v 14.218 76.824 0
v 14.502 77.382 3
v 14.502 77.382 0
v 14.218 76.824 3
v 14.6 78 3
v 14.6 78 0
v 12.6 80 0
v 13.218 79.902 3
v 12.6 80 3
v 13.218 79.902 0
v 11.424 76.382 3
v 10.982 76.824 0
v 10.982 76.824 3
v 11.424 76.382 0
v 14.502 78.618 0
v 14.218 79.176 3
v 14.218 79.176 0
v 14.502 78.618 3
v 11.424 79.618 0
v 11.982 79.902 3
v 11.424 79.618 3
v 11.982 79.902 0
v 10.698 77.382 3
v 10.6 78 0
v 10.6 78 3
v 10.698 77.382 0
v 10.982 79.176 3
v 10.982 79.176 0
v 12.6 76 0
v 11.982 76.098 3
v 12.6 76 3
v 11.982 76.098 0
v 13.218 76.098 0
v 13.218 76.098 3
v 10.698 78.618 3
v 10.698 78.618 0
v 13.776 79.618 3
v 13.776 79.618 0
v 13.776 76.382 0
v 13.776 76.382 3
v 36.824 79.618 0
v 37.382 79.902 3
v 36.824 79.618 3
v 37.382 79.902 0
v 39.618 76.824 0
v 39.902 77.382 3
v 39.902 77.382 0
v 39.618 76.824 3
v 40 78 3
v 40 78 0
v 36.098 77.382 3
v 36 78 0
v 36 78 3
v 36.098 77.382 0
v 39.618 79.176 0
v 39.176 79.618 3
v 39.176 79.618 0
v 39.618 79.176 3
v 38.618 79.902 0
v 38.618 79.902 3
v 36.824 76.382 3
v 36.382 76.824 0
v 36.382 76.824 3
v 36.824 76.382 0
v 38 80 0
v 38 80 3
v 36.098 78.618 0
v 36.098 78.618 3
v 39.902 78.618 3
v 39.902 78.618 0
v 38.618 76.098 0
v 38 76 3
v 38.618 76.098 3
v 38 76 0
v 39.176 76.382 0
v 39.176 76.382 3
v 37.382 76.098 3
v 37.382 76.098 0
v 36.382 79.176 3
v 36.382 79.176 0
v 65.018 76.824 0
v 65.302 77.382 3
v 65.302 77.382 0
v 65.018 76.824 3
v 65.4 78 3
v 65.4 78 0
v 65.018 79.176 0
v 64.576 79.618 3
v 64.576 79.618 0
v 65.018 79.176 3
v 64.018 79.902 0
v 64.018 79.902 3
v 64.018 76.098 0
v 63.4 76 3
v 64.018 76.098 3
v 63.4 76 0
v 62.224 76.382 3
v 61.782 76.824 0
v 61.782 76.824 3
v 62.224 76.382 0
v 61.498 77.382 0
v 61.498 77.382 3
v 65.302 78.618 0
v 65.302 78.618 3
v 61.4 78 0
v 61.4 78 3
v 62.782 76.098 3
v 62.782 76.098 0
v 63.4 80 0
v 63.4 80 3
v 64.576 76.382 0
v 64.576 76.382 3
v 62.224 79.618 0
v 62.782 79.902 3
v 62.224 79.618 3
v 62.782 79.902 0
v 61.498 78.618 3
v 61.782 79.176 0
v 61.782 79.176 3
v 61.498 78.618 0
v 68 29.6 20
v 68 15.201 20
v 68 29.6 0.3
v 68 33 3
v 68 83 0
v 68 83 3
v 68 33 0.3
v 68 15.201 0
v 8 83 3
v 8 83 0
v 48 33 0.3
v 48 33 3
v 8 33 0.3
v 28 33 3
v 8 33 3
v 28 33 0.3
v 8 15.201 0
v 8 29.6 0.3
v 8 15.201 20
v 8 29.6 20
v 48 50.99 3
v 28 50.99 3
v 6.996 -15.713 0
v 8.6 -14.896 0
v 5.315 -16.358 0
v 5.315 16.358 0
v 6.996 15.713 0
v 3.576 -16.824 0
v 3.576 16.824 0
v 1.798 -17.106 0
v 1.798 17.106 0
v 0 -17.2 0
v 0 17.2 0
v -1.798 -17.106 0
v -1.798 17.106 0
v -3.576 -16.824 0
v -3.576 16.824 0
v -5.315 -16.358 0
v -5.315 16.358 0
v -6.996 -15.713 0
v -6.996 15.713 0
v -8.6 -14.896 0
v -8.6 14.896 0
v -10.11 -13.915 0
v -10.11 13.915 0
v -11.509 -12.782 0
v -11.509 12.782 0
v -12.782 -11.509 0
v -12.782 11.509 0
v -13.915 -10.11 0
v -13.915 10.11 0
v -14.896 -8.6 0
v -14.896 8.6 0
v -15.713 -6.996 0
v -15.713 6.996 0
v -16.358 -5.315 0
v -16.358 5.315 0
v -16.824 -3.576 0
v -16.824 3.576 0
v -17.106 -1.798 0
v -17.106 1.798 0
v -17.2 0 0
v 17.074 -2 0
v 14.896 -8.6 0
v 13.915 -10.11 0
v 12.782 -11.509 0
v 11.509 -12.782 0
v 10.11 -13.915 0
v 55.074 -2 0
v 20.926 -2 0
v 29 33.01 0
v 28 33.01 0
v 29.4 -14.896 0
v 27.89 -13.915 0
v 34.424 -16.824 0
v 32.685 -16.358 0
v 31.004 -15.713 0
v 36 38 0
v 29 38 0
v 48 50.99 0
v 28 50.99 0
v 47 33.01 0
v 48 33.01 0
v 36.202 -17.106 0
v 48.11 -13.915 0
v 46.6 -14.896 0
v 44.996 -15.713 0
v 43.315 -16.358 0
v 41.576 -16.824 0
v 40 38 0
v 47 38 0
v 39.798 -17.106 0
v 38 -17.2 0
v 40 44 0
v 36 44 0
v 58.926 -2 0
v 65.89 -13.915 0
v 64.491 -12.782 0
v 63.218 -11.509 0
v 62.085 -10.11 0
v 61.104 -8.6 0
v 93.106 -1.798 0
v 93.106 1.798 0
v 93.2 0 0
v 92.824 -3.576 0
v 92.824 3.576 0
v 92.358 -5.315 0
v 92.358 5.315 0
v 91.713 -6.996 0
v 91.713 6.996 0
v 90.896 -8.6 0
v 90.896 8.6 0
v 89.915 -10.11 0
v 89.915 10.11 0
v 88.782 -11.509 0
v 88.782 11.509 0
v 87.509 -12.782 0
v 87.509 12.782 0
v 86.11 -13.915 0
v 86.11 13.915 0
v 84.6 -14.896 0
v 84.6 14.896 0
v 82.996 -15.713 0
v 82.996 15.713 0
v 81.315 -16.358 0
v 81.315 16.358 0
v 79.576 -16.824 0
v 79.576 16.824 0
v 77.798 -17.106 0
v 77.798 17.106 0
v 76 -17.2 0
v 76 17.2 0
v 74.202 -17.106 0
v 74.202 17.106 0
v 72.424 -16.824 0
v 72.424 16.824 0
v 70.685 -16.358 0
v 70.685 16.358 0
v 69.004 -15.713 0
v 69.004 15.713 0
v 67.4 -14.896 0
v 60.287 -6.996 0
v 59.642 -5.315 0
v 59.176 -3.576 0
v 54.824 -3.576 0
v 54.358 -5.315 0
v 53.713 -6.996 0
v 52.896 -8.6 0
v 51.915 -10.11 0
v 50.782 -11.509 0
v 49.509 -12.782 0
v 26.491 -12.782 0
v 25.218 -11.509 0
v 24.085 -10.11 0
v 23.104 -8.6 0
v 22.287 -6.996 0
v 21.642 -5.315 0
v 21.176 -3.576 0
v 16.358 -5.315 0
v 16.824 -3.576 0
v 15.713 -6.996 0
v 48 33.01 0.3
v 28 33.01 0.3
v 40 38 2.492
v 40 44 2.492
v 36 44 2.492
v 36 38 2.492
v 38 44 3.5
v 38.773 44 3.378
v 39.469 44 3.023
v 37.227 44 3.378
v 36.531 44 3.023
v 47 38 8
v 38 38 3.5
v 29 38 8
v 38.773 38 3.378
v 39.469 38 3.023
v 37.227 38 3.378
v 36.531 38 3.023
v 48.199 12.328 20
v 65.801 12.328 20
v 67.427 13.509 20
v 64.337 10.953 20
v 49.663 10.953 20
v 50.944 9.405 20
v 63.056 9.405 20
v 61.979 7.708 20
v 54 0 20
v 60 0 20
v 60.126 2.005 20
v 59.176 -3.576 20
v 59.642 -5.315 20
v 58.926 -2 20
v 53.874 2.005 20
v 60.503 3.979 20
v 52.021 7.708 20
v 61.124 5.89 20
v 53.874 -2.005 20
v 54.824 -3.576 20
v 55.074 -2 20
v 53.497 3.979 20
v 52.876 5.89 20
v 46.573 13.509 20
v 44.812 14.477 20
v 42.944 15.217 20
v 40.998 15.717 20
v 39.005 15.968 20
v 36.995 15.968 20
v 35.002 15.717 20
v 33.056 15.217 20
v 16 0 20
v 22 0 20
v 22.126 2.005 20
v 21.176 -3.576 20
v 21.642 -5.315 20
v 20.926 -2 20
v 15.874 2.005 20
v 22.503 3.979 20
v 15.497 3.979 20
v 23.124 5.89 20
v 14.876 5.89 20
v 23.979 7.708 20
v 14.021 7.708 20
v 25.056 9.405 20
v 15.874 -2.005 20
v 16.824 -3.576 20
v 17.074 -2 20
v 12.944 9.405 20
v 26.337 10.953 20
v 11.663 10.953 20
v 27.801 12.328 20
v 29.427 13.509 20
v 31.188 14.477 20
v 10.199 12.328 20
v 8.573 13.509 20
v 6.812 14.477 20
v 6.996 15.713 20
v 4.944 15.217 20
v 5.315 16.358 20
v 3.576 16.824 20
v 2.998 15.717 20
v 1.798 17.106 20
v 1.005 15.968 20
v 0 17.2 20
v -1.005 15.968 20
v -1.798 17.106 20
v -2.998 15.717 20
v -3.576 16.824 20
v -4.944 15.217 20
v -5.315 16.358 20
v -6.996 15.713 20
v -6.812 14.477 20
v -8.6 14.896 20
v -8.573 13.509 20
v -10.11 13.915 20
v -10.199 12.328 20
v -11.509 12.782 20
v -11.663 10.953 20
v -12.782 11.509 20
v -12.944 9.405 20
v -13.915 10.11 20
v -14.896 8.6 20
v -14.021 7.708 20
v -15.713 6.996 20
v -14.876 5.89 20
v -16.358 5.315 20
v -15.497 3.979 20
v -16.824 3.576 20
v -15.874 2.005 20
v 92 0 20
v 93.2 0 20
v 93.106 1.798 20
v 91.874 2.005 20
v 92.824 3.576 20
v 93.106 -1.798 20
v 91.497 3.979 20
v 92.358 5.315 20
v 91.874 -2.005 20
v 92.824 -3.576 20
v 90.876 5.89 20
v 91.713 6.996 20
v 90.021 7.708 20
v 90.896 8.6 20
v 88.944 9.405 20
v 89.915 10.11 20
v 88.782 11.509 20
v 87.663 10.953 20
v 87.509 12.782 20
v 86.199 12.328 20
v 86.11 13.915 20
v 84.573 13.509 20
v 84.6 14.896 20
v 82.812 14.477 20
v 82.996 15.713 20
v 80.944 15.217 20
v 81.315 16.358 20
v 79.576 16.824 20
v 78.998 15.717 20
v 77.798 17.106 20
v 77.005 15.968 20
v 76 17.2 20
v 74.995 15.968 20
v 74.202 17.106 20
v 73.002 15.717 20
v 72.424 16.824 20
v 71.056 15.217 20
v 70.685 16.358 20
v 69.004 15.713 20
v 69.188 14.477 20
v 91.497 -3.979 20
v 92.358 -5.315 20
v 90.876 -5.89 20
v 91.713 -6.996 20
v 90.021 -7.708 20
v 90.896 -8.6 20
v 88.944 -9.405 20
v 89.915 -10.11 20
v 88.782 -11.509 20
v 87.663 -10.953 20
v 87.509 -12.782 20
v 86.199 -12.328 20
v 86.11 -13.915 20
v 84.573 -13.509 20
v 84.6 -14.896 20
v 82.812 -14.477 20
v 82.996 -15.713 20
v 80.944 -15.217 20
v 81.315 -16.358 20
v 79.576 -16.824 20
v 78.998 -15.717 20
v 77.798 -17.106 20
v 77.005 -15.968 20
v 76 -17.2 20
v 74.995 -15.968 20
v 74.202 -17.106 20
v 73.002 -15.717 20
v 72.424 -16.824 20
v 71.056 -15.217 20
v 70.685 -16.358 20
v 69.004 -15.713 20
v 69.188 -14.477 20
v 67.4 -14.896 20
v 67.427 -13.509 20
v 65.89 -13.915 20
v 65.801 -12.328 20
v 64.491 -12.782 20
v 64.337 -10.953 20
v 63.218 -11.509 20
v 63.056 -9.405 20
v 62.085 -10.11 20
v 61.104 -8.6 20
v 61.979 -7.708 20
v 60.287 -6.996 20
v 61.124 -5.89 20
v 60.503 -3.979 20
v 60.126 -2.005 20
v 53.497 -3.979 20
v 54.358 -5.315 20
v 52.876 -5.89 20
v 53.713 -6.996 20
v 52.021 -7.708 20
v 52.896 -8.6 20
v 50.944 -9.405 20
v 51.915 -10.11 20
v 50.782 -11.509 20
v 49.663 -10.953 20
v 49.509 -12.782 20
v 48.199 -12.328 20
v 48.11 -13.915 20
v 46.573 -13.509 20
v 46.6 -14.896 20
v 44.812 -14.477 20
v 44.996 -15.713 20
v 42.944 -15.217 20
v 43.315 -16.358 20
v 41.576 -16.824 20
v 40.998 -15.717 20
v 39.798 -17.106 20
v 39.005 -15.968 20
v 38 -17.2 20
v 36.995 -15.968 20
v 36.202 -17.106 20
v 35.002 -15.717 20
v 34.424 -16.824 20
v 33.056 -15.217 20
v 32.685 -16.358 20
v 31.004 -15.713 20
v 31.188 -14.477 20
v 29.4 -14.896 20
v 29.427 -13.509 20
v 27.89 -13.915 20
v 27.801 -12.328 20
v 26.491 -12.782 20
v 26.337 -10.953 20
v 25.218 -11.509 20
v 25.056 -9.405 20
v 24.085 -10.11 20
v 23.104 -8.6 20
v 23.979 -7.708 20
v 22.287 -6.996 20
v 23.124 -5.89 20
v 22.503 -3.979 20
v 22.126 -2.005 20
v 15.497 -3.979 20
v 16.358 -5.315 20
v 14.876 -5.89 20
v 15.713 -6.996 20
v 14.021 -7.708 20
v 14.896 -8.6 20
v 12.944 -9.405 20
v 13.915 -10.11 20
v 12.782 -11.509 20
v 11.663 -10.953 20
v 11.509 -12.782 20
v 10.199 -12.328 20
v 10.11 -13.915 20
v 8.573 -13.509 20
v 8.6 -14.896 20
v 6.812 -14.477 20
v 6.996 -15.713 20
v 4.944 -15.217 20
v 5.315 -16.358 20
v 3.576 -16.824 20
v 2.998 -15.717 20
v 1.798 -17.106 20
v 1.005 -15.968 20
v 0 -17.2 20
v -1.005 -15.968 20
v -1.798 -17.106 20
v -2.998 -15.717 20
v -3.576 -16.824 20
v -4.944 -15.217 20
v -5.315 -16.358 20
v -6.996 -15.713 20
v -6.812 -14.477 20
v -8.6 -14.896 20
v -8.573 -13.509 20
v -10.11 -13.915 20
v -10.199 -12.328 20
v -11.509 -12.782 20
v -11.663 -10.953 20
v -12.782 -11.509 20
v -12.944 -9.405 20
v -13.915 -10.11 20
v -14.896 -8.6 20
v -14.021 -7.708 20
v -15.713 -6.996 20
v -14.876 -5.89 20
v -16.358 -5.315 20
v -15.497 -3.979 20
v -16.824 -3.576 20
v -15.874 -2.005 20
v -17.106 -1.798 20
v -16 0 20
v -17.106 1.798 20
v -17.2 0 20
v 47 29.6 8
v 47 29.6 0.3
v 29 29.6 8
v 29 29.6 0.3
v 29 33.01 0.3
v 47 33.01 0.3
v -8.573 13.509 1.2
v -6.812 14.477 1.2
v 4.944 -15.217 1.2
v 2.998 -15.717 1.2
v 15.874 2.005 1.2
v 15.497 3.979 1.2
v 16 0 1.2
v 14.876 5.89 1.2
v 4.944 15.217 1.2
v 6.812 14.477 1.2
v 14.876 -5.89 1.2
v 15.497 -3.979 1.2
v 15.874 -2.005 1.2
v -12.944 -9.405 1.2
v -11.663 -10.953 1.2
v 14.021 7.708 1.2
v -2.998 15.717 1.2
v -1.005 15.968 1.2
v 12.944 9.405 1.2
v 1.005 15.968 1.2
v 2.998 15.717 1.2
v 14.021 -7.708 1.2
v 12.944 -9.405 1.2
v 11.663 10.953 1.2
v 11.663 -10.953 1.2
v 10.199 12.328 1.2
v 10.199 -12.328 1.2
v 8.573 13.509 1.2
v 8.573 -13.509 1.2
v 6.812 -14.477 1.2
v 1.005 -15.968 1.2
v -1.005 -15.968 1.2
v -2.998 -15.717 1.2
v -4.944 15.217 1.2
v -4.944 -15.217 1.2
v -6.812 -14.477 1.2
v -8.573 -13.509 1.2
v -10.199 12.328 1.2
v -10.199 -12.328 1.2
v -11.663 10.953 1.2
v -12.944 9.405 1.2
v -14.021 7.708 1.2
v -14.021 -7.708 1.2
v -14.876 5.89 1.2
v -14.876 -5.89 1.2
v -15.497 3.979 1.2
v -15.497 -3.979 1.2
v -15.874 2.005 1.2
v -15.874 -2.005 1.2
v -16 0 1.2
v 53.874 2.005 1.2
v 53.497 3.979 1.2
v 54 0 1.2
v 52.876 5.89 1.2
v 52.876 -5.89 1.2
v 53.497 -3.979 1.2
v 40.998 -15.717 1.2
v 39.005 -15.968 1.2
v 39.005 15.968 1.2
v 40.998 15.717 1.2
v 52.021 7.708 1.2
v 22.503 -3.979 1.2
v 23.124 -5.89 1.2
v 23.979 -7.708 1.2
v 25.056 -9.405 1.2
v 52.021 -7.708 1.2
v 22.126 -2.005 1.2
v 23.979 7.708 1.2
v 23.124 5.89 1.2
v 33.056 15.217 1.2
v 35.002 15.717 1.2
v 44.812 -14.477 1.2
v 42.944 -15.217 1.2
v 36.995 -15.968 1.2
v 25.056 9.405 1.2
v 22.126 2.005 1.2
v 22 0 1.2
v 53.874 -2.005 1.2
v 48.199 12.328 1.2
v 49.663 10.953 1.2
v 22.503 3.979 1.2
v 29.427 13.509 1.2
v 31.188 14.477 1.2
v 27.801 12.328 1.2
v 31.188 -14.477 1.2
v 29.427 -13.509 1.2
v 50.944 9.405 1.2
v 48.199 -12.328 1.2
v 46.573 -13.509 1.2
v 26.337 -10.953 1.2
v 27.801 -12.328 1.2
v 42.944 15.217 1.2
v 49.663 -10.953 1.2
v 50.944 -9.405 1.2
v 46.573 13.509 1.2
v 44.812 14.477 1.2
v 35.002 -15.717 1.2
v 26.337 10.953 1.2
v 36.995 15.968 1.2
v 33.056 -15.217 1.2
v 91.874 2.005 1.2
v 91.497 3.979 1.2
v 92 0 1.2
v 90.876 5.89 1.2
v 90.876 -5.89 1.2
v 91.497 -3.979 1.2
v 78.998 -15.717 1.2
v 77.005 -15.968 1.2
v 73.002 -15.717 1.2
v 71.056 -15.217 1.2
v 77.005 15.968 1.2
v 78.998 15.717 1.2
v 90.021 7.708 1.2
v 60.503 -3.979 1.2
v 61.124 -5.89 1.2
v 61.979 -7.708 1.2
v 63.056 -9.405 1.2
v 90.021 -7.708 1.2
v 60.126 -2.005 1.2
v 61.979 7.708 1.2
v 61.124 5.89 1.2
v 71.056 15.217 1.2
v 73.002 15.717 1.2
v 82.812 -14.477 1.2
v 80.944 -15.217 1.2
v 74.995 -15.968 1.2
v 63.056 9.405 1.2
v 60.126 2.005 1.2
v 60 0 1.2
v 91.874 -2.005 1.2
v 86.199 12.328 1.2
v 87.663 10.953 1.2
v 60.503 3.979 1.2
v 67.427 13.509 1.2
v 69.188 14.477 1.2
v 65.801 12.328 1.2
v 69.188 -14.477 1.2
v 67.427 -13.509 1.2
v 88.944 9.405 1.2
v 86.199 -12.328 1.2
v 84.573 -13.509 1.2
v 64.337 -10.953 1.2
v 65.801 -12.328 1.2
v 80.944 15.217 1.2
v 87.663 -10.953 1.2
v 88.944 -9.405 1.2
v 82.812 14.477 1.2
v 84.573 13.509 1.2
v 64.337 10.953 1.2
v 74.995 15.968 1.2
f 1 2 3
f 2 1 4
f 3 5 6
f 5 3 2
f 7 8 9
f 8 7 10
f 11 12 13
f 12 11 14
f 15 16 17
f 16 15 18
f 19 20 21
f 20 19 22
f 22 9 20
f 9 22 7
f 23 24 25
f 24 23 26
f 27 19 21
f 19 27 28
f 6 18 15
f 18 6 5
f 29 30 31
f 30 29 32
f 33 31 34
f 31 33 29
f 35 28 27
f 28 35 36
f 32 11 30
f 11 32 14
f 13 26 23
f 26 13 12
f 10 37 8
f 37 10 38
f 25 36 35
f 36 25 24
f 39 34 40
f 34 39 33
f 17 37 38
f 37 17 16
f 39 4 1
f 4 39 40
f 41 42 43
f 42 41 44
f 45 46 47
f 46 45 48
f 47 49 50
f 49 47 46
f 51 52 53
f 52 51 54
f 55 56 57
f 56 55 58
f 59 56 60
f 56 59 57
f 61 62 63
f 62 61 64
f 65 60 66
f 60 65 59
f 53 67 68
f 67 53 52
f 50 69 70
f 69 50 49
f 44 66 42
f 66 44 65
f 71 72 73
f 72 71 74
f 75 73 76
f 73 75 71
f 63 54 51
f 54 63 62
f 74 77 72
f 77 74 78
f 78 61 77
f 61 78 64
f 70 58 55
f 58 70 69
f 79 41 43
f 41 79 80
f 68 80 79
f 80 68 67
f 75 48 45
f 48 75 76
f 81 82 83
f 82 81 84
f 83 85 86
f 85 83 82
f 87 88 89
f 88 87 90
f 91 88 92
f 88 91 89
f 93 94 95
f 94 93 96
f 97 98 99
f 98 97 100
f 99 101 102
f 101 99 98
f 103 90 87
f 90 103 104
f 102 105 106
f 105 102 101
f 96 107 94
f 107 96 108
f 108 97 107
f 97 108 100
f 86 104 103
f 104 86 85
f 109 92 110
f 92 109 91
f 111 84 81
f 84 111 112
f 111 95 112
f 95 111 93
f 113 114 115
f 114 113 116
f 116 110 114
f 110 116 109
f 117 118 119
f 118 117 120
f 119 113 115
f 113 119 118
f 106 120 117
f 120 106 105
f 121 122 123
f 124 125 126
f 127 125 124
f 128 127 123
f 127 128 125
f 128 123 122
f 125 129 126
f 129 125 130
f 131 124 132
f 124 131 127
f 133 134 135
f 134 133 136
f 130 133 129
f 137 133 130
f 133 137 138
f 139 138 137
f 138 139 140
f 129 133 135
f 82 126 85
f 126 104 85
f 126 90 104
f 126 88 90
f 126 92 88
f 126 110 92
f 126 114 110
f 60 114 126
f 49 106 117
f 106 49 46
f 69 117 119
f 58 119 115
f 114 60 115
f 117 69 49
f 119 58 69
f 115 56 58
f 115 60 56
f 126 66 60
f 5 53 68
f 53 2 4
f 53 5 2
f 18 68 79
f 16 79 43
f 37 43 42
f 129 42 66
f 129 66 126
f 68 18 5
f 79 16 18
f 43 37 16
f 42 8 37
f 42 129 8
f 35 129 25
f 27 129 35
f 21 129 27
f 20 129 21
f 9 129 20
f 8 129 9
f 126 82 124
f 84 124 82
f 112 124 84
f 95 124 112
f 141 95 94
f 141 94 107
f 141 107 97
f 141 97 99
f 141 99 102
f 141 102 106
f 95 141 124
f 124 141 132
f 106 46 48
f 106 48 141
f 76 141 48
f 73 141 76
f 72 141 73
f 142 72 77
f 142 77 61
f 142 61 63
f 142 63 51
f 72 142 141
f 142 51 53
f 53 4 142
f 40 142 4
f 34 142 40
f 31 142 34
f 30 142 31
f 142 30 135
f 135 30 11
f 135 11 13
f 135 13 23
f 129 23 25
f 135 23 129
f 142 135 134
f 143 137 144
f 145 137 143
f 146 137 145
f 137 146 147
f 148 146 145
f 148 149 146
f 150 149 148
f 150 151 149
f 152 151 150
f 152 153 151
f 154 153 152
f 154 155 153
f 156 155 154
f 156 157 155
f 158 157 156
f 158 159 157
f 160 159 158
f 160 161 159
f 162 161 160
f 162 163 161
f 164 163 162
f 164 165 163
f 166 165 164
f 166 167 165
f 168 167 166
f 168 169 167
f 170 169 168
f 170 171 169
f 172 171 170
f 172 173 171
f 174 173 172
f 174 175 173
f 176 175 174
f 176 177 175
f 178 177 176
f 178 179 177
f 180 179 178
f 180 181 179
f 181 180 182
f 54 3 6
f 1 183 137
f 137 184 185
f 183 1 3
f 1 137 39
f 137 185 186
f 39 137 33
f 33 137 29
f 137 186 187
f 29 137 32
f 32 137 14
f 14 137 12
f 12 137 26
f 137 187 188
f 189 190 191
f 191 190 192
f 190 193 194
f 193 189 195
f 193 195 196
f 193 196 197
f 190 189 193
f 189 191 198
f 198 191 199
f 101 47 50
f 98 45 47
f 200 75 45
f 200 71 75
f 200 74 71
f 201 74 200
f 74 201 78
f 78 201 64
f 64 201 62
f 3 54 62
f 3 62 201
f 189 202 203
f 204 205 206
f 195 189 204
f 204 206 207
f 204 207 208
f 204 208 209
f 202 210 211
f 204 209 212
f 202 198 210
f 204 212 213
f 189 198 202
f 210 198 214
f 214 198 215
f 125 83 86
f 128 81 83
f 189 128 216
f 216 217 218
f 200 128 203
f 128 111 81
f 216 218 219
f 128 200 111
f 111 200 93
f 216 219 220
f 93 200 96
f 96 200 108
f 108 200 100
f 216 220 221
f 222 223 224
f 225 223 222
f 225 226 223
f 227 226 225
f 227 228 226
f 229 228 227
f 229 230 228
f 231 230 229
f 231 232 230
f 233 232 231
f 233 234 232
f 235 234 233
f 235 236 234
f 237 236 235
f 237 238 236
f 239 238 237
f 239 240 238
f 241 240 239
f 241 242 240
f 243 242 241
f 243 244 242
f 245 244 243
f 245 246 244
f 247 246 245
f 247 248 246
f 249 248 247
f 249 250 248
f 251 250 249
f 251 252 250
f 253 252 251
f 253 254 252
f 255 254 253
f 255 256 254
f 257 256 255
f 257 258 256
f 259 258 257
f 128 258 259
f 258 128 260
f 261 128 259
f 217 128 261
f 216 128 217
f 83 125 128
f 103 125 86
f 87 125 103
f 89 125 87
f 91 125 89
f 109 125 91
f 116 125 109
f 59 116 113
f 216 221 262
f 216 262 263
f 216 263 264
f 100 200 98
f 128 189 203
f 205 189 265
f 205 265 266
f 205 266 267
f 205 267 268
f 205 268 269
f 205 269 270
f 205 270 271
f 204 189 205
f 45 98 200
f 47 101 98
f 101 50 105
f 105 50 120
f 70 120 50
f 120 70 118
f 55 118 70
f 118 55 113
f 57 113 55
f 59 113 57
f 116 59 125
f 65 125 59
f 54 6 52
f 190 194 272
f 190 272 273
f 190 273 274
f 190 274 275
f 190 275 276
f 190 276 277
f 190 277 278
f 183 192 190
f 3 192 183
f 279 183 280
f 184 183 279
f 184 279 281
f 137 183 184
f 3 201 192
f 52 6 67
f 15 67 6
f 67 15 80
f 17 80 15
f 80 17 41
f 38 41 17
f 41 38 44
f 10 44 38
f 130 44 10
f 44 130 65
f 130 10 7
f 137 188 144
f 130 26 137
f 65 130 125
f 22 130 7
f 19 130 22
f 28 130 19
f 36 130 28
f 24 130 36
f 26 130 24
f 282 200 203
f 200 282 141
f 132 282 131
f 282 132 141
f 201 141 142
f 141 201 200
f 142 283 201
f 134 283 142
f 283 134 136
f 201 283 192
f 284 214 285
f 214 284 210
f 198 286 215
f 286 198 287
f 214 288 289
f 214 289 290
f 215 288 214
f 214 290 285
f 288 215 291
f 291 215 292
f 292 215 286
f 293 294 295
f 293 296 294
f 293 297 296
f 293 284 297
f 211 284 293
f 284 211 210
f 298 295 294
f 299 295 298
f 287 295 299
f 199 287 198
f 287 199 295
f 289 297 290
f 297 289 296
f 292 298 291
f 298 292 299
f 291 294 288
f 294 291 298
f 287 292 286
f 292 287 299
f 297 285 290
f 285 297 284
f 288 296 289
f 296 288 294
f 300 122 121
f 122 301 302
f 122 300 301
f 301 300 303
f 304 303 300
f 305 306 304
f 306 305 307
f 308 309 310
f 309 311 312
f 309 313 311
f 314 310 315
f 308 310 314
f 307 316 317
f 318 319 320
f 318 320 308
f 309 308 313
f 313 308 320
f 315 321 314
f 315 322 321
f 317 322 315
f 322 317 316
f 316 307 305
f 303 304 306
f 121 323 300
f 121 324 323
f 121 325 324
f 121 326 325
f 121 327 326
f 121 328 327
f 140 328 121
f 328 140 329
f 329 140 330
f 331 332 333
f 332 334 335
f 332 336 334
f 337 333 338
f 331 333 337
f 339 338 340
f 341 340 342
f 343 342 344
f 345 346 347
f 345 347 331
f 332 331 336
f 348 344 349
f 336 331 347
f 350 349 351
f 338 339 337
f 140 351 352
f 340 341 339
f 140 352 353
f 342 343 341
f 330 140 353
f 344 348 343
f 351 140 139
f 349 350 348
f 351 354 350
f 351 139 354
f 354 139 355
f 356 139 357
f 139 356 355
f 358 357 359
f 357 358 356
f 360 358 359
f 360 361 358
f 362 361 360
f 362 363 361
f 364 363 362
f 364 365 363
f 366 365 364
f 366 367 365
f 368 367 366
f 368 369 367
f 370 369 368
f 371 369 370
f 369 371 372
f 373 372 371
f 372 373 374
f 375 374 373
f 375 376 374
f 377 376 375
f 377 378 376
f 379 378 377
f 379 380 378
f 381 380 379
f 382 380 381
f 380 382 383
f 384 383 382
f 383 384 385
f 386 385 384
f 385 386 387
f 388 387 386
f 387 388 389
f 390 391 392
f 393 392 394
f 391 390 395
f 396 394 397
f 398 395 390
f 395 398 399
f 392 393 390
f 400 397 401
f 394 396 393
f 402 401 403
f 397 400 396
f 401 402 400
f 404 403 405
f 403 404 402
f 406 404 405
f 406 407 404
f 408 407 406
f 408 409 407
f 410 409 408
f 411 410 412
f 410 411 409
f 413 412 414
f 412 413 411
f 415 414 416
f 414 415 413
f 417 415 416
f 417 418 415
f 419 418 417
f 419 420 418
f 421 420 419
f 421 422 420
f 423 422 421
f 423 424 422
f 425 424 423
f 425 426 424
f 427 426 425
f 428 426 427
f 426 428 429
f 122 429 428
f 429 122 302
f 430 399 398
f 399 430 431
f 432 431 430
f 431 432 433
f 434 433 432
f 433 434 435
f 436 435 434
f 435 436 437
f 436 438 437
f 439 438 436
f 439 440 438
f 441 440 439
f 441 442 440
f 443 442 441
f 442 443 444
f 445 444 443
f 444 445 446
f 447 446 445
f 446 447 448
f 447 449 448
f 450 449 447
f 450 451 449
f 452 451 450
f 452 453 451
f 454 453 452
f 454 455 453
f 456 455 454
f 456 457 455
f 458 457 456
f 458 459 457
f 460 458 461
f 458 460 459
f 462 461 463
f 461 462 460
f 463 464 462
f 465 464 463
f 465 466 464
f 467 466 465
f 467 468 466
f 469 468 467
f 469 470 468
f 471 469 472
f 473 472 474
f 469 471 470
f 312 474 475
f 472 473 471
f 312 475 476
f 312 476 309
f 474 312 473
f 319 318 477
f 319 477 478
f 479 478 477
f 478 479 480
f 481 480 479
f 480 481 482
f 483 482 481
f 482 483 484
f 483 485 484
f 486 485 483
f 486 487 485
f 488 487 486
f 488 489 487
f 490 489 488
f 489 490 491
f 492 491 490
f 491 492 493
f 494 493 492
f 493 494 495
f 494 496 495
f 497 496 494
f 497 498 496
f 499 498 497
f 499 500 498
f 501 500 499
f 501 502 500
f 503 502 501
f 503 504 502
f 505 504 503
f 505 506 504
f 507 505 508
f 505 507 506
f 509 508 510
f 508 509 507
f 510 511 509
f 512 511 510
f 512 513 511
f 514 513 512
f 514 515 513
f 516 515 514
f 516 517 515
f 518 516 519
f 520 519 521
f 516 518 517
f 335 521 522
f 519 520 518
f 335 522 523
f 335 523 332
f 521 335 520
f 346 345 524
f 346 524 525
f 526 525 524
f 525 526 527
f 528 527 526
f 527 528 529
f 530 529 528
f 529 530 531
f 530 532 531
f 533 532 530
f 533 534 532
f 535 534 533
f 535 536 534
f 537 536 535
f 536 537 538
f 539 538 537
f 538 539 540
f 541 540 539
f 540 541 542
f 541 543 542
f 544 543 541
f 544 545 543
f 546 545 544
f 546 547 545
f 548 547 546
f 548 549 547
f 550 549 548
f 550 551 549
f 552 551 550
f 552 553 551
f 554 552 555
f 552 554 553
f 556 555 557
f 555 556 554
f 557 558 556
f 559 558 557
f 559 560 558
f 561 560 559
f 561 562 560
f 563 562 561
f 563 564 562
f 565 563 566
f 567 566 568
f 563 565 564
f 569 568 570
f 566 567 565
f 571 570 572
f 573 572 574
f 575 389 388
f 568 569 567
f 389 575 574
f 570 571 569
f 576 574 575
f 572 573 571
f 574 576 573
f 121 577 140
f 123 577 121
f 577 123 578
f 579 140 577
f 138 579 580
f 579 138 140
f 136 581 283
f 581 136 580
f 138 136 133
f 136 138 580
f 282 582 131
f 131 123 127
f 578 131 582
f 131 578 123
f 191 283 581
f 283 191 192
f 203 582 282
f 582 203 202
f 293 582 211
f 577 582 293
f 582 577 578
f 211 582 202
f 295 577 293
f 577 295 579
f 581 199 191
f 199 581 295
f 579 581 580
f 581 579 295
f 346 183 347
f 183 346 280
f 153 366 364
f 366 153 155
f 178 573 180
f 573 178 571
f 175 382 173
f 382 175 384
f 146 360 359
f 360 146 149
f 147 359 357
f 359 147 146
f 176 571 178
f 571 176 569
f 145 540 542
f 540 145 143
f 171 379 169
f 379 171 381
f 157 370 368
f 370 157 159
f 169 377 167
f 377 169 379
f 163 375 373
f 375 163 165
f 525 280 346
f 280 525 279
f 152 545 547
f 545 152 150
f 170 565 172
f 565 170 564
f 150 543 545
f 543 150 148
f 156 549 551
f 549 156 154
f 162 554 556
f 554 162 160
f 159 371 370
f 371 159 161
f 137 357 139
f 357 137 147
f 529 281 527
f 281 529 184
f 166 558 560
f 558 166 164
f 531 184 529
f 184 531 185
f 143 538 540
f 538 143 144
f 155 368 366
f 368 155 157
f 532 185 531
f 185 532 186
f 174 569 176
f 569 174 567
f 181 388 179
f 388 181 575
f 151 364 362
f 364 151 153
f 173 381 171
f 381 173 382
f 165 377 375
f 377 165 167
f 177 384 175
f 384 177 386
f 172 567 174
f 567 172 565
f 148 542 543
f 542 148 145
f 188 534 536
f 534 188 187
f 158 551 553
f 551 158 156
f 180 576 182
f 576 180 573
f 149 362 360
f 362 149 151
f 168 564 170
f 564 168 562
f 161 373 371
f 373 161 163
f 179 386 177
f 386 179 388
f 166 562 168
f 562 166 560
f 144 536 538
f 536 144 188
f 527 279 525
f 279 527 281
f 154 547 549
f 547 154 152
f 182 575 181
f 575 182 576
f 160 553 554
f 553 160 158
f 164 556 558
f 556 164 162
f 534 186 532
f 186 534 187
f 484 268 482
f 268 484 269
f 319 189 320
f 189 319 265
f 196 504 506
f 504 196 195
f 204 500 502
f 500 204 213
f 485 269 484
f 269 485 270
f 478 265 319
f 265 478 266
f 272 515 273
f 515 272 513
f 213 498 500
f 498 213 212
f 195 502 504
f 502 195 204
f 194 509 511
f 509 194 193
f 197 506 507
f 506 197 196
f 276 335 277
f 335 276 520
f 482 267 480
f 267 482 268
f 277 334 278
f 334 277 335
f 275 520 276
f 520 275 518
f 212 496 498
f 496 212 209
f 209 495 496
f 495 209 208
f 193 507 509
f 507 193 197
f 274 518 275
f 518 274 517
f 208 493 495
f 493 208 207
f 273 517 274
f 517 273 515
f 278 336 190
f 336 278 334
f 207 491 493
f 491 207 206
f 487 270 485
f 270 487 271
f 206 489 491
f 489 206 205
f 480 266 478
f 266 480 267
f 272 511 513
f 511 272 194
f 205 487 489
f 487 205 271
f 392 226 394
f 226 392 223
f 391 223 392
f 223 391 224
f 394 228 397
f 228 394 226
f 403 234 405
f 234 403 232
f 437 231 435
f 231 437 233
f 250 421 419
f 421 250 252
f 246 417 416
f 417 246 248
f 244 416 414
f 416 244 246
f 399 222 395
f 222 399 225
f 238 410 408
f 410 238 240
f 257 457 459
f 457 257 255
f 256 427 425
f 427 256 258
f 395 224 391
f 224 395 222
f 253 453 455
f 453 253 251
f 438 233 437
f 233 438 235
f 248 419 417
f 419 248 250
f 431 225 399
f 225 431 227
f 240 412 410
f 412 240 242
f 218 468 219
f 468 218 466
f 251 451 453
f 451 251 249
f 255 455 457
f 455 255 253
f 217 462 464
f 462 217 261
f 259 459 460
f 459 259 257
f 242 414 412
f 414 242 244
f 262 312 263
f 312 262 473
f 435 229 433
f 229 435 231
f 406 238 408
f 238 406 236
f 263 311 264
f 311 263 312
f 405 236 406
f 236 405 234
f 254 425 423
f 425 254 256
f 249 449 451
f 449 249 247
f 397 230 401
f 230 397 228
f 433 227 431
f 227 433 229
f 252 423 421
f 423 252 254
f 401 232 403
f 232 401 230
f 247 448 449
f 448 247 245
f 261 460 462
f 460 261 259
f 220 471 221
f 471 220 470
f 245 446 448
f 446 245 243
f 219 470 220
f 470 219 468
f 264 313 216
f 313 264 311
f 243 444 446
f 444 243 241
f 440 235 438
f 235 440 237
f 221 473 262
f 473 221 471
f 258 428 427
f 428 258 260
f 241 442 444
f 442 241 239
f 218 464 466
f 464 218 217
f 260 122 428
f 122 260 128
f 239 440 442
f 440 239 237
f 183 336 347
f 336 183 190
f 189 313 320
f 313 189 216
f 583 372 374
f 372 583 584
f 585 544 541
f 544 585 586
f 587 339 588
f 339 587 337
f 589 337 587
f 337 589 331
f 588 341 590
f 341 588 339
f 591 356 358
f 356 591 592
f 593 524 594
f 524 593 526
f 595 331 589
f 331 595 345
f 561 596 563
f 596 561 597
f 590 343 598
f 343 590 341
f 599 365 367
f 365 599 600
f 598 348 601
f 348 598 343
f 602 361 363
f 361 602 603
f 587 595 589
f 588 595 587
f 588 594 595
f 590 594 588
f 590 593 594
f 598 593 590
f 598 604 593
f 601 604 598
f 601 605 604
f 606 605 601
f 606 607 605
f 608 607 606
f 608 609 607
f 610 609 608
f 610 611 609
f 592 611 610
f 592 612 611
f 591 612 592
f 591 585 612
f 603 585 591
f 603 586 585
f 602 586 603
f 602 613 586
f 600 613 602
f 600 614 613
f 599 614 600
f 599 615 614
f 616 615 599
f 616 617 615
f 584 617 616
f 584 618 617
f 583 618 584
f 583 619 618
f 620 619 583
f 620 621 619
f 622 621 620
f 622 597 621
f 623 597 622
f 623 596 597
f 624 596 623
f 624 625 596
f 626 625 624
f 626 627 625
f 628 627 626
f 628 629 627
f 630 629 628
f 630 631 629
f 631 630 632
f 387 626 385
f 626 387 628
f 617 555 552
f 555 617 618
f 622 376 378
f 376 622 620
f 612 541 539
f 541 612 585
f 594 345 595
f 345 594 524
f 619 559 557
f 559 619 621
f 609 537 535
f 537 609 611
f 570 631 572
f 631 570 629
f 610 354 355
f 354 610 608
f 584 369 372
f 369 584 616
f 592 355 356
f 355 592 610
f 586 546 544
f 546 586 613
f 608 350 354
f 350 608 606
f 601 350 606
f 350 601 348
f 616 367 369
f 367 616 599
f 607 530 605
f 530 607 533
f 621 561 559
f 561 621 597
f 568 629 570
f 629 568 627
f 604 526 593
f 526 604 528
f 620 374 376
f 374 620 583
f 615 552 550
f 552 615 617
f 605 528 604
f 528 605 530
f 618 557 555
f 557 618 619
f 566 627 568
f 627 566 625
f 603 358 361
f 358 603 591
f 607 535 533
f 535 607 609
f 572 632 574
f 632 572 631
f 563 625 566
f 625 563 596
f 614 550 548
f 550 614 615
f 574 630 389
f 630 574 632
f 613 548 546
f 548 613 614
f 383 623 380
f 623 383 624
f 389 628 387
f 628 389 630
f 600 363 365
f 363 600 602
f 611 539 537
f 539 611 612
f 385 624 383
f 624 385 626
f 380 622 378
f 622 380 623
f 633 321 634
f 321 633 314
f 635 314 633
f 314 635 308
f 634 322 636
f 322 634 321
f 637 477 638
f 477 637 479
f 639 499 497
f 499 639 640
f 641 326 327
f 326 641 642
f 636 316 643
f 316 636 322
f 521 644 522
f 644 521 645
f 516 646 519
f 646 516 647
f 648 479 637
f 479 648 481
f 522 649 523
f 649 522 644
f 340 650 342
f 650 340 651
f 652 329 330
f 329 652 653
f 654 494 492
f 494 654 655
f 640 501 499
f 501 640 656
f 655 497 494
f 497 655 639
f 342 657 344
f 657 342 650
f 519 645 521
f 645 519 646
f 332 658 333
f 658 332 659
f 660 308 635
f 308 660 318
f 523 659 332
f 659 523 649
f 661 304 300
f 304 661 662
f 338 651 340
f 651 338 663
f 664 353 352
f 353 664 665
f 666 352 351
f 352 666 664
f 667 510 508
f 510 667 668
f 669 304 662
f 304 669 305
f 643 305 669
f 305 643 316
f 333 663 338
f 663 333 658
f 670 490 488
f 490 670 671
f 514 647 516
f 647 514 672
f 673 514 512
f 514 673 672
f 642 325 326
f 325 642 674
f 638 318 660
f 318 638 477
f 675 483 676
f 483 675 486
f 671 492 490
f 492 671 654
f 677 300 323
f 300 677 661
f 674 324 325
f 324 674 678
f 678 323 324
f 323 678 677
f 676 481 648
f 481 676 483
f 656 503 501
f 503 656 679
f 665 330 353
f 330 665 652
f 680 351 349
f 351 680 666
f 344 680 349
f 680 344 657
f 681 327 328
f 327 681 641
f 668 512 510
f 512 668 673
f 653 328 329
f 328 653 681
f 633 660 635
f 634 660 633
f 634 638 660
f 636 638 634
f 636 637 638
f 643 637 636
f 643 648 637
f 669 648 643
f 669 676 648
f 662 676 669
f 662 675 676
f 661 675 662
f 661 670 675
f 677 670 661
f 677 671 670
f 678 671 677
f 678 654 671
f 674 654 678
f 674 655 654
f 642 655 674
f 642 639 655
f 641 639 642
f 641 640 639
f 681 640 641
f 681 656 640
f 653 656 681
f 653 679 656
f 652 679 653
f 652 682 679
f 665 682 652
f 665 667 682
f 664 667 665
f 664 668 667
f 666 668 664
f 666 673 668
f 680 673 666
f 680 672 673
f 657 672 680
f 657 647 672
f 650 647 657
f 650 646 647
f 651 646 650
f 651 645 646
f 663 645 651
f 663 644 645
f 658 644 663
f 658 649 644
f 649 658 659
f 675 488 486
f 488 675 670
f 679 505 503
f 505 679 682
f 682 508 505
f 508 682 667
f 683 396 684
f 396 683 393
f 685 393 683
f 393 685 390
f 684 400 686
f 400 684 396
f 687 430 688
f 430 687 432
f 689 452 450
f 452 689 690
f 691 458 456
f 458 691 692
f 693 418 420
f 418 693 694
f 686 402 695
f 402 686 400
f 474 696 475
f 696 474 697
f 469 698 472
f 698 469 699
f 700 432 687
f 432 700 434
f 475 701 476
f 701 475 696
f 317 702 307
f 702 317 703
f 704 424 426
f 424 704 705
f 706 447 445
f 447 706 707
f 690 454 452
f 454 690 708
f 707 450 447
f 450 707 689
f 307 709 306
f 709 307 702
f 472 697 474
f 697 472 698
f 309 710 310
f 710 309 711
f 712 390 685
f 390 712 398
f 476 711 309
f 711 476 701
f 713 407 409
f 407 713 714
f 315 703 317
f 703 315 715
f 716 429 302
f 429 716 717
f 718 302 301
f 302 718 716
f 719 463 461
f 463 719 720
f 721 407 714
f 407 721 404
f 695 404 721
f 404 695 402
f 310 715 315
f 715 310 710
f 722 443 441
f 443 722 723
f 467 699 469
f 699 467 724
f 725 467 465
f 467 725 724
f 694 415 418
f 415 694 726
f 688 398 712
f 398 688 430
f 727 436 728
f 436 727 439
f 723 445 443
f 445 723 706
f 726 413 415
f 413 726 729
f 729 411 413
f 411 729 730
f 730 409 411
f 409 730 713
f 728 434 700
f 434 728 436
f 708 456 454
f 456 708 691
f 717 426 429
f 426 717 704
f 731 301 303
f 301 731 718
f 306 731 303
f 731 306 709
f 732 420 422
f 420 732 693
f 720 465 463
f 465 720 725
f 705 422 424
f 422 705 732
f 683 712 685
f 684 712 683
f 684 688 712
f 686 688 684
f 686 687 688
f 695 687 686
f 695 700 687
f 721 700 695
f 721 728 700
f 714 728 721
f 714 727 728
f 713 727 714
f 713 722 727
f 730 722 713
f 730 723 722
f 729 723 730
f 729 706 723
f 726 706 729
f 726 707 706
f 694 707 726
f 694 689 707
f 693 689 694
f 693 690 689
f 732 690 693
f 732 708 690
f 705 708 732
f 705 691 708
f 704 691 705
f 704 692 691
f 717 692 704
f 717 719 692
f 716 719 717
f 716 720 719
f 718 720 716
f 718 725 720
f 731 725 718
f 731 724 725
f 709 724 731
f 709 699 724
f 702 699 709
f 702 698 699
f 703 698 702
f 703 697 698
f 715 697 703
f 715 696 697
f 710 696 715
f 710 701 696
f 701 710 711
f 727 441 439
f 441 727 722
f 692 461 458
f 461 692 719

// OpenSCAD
id=32;
t=1.2;
cylh=20;
num=3;
*!difference(){
  cylinder(d=id+t*2,h=10,$fn=60);
  translate([0,0,-.01]) cylinder(d=id,h=30,$fn=50);
}
translate([((num-1)*38)/2-(60/2),33,0]) rotate([-90,0]) mirror([0,1]) difference() {
  cube([60,3,50]);
  translate([20,-.01,-.01]) cube([20,3.02,18]);
  translate([60/2-50.8/2,0]) for(x=[0:2])
    translate([x*25.4,-.01,45]) rotate([-90,0]) cylinder(d=4,h=5,$fn=20);
}
difference(){
  union() {
    translate([((num-1)*38)/2-(60/2),0]) {
      cube([60,29.6,20]);
      cube([60,33.01,0.3]);
      translate([21,29,0]) cube([18,9,8]);
      translate([28,38,0]) intersection() {
        cube([4,6,4]);
        translate([2,0,1]) rotate([-90,0]) cylinder(d=5,h=6,$fn=20);
      }
    }
    translate([0,-2]) cube([(num-1)*38,4,20]);
    for(x=[0:num-1]) translate([x*38,0]) 
      cylinder(d=id+t*2,h=cylh,$fn=60);
  }
  for(x=[0:num-1]) translate([x*38,0]) 
    translate([0,0,t]) cylinder(d=id,h=cylh,$fn=50);
}
